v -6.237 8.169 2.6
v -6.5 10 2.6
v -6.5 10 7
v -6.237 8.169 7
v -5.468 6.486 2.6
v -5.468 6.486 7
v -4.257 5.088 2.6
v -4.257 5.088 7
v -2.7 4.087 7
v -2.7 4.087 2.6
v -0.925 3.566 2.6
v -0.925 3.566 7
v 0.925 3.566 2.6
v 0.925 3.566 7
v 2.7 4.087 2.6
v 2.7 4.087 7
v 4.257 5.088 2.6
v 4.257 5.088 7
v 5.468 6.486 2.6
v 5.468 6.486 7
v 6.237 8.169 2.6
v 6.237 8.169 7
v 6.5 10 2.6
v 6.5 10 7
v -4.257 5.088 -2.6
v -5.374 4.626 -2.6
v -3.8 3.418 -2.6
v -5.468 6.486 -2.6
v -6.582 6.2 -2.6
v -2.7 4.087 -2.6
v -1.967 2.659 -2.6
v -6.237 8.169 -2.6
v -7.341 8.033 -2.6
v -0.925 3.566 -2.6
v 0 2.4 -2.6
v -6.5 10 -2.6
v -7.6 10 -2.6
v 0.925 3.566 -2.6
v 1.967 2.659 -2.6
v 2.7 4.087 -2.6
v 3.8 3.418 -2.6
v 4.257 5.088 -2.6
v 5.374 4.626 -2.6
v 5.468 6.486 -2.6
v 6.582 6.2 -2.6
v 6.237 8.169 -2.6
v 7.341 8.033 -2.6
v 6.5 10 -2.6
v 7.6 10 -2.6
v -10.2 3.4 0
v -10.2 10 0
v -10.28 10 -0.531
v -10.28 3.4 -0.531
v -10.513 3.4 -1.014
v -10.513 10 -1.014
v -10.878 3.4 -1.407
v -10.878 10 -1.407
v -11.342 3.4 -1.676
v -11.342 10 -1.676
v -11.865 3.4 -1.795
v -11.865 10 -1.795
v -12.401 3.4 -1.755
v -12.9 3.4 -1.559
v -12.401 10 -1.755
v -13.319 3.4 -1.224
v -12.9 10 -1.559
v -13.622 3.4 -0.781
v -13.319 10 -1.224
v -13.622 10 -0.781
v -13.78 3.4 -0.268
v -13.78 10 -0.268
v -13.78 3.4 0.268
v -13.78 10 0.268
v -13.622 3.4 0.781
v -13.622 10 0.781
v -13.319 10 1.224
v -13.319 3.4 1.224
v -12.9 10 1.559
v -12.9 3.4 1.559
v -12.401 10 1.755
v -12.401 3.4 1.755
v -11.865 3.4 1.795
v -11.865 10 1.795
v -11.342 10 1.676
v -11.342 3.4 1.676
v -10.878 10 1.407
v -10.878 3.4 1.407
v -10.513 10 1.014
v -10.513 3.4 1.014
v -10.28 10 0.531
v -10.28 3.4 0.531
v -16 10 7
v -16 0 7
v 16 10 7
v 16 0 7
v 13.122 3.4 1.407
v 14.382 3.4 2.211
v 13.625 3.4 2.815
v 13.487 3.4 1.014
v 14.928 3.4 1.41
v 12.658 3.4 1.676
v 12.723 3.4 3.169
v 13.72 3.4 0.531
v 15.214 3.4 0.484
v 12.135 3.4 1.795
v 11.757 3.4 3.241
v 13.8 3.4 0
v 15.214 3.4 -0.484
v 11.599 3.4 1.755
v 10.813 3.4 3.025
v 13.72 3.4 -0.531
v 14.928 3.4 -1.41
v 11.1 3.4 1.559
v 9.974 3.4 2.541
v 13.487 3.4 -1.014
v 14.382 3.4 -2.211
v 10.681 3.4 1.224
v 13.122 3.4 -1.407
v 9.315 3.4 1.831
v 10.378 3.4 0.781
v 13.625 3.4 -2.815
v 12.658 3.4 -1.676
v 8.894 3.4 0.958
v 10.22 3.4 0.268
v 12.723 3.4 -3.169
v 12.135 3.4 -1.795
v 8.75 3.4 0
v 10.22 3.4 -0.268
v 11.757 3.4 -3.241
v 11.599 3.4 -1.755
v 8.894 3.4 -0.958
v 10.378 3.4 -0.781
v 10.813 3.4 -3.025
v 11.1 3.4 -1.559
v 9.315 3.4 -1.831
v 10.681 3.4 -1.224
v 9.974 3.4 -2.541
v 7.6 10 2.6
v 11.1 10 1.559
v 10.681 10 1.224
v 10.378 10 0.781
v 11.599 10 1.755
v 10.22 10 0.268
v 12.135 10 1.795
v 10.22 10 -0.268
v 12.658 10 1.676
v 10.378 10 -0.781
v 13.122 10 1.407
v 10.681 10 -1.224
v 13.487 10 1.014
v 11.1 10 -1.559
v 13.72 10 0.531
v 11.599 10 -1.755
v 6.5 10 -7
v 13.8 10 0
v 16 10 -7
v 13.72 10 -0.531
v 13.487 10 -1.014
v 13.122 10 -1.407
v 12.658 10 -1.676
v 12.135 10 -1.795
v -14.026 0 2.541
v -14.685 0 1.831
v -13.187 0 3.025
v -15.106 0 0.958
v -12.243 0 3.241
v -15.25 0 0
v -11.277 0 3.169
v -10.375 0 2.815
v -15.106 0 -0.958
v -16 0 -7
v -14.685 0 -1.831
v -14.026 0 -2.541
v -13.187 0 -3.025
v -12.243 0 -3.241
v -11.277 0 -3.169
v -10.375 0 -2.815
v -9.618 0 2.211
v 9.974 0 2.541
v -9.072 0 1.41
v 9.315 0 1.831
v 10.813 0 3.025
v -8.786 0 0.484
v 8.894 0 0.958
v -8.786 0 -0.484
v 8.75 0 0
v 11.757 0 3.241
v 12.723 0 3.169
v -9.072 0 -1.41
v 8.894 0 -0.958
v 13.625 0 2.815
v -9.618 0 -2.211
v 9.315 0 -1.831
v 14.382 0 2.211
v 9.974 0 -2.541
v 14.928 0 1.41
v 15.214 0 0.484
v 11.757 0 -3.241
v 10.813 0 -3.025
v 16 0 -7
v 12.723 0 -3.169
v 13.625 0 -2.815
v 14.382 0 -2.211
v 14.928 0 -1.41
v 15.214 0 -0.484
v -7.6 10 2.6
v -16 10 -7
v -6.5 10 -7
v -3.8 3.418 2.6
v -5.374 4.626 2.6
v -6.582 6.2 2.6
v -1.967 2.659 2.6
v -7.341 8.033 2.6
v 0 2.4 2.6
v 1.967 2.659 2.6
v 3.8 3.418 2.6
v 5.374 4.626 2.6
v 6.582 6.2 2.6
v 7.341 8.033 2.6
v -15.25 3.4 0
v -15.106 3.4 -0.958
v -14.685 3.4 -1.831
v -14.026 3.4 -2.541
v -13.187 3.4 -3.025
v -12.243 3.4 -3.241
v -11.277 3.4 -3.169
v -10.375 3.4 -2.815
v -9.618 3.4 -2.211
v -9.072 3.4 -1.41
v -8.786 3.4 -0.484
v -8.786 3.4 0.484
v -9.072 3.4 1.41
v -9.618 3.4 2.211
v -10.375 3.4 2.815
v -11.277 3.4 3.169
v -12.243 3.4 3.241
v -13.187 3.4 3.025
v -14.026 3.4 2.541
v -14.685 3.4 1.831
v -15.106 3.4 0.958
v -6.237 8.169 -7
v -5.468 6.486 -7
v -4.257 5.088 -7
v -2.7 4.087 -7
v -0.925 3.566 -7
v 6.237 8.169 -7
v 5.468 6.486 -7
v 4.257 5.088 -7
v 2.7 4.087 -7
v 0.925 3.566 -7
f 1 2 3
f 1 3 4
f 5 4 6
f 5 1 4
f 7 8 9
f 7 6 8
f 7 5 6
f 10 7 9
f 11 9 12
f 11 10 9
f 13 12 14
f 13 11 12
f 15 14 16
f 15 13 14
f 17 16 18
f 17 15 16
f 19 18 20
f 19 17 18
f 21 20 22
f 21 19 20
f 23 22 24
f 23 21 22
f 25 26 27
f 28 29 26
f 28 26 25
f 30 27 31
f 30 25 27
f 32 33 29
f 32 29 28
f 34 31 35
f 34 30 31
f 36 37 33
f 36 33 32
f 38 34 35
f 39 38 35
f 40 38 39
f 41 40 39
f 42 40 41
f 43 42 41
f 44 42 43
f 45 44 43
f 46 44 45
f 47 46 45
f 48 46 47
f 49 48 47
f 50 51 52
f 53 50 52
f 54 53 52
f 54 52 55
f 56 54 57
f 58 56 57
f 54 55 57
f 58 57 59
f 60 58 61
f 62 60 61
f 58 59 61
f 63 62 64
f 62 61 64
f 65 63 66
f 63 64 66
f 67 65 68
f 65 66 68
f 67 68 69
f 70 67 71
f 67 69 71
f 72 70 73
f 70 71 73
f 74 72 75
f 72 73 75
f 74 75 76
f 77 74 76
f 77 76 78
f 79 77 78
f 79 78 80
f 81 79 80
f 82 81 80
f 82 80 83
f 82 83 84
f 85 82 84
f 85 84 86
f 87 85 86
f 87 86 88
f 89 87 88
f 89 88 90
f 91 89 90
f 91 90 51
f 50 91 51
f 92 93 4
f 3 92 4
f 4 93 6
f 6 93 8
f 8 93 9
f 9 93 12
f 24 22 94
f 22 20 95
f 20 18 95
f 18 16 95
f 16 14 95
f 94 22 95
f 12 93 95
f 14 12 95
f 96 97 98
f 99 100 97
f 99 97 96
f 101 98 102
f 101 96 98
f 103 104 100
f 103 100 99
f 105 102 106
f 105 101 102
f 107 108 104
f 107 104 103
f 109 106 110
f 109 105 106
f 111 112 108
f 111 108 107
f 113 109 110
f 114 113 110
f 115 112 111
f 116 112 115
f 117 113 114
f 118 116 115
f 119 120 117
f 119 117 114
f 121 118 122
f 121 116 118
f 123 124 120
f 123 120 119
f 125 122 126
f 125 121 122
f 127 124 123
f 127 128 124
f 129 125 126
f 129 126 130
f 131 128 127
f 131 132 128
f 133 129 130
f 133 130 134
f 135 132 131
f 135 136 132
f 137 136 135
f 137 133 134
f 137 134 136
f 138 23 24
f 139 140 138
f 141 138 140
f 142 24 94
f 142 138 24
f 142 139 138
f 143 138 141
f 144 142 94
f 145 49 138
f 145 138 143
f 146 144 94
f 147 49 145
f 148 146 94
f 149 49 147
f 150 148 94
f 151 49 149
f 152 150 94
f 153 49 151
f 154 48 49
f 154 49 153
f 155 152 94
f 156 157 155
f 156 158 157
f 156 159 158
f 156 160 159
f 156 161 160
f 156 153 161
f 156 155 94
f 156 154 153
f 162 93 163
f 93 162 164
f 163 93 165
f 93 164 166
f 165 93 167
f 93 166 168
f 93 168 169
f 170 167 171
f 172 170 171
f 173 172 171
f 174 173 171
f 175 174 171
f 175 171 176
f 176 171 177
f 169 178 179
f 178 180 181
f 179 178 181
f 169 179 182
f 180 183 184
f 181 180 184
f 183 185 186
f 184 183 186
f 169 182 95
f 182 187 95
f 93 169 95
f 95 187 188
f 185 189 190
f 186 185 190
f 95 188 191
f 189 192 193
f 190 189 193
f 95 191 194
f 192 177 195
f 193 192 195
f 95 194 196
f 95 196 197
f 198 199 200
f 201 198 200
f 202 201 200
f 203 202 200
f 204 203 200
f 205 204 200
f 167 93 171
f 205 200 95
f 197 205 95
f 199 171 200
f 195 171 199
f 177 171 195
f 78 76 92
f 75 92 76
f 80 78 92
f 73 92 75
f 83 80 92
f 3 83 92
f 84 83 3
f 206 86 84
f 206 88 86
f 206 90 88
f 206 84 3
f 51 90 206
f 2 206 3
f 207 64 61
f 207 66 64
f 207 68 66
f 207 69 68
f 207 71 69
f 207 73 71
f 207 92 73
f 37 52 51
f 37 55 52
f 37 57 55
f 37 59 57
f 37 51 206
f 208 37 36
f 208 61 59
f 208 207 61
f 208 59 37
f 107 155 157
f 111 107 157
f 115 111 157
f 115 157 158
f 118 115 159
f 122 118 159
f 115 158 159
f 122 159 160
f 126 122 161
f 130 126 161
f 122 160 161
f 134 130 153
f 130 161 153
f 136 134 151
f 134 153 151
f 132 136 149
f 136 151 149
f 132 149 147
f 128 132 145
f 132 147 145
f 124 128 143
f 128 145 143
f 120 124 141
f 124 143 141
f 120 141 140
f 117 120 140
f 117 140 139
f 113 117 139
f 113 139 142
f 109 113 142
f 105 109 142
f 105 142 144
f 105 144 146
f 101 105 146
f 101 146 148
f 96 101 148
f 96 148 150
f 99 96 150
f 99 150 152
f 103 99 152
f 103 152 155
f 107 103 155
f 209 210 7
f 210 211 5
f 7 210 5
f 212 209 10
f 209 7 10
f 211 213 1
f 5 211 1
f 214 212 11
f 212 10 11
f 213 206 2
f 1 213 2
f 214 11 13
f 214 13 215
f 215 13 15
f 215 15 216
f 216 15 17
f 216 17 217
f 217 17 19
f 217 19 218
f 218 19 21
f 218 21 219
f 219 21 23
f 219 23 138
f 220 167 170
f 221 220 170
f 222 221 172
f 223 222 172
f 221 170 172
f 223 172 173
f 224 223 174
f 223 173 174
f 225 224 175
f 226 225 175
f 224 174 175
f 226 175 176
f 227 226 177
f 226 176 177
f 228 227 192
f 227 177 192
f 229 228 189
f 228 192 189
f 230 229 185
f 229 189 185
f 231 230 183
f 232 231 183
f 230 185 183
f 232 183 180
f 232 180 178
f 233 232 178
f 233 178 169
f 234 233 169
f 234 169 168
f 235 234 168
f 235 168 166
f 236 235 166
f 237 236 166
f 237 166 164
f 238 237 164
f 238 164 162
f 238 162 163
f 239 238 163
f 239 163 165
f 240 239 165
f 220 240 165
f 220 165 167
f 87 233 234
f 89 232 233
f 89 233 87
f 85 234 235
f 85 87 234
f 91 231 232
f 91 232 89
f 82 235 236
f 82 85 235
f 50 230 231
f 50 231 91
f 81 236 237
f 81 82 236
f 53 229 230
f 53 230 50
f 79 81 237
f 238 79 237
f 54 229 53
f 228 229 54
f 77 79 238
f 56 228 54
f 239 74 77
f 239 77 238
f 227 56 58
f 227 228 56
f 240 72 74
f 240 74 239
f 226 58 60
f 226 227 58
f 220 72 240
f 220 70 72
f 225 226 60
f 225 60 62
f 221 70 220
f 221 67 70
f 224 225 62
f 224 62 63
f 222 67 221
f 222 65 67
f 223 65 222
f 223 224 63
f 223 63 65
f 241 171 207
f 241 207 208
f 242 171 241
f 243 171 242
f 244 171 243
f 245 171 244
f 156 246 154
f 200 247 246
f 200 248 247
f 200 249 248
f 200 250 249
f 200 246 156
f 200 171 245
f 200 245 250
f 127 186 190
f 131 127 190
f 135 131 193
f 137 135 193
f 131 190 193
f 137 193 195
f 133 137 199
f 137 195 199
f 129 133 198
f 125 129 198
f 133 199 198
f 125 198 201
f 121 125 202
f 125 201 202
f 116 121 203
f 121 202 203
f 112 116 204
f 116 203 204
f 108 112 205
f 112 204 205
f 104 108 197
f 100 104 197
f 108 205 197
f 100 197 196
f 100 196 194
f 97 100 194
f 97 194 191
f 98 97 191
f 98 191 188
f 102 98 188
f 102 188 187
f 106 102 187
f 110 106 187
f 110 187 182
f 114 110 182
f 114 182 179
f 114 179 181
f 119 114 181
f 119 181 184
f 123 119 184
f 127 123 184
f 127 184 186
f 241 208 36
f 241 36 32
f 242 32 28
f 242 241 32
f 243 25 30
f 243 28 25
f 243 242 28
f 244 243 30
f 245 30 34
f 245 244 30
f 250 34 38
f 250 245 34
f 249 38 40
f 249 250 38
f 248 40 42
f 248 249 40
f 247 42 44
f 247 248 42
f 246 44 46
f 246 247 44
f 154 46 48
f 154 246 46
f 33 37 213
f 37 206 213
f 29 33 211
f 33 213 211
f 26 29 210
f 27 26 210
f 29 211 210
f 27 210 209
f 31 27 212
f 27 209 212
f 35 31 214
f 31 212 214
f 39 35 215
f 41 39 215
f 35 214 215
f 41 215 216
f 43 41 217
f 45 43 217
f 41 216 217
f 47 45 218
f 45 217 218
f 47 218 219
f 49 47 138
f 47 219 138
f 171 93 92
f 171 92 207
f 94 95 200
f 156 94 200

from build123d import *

# Parameters (mm, degrees)
SKETCH_1_W                   = 32
SKETCH_1_H                   = 14
EXTRUDE_1_DEPTH              = 10
SKETCH_2_R                   = 7.6
CUT_EXTRUDE_1_DEPTH          = 2.6
CUT_EXTRUDE_2_DEPTH          = 21.124611797
CUT_EXTRUDE_2_DEPTH_BACK     = 21.124611797
SKETCH_3_R                   = 6.5
SKETCH_4_R                   = 1
CUT_EXTRUDE_3_DEPTH          = 21.124611797
HOLE_WIZARD_M3_1_D           = 3.6
HOLE_WIZARD_M3_1_DEPTH       = 10
HOLE_WIZARD_M3_1_CBORE_D     = 6.5
HOLE_WIZARD_M3_1_CBORE_DEPTH = 3.4


with BuildPart() as part:
    # 草圖1 → 填料-伸長1 (new body)
    with BuildSketch(Plane(origin=(0, 0, 0), x_dir=(1, 0, 0), z_dir=(0, 1, 0))):
        Rectangle(SKETCH_1_W, SKETCH_1_H)
    extrude(amount=EXTRUDE_1_DEPTH)

    # 草圖2 → 除料-伸長1 (cut, symmetric)
    with BuildSketch(Plane.XY):
        with Locations((0, 10)):
            Circle(SKETCH_2_R)
    extrude(amount=CUT_EXTRUDE_1_DEPTH, both=True, mode=Mode.SUBTRACT)

    # 草圖3 → 除料-伸長2 (cut, two sides: drawn at the far end of the back side and taken through both)
    with BuildSketch(Plane.XY.offset(-CUT_EXTRUDE_2_DEPTH_BACK)):
        with Locations((0, 10)):
            Circle(SKETCH_3_R)
    extrude(amount=CUT_EXTRUDE_2_DEPTH + CUT_EXTRUDE_2_DEPTH_BACK, mode=Mode.SUBTRACT)

    # 草圖4 → 除料-伸長3 (cut, through all)
    with BuildSketch(Plane(origin=(0, 10, 0), x_dir=(1, 0, 0), z_dir=(0, 1, 0))):
        with Locations(Location((-12, 0, 0), (0, 0, 270))):
            Circle(SKETCH_4_R)
        with Locations(Location((12, 0, 0), (0, 0, 90))):
            Circle(SKETCH_4_R)
    extrude(amount=-CUT_EXTRUDE_3_DEPTH, mode=Mode.SUBTRACT)

    # M3 六角承窩頭蓋螺釘的柱孔1
    with Locations(Plane(origin=(0, 0, 0), x_dir=(-1, 0, 0), z_dir=(0, -1, 0))):
        with Locations((-12, 0), (12, 0)):
            CounterBoreHole(HOLE_WIZARD_M3_1_D / 2, HOLE_WIZARD_M3_1_CBORE_D / 2, HOLE_WIZARD_M3_1_CBORE_DEPTH, depth=HOLE_WIZARD_M3_1_DEPTH)


solid = part.part
